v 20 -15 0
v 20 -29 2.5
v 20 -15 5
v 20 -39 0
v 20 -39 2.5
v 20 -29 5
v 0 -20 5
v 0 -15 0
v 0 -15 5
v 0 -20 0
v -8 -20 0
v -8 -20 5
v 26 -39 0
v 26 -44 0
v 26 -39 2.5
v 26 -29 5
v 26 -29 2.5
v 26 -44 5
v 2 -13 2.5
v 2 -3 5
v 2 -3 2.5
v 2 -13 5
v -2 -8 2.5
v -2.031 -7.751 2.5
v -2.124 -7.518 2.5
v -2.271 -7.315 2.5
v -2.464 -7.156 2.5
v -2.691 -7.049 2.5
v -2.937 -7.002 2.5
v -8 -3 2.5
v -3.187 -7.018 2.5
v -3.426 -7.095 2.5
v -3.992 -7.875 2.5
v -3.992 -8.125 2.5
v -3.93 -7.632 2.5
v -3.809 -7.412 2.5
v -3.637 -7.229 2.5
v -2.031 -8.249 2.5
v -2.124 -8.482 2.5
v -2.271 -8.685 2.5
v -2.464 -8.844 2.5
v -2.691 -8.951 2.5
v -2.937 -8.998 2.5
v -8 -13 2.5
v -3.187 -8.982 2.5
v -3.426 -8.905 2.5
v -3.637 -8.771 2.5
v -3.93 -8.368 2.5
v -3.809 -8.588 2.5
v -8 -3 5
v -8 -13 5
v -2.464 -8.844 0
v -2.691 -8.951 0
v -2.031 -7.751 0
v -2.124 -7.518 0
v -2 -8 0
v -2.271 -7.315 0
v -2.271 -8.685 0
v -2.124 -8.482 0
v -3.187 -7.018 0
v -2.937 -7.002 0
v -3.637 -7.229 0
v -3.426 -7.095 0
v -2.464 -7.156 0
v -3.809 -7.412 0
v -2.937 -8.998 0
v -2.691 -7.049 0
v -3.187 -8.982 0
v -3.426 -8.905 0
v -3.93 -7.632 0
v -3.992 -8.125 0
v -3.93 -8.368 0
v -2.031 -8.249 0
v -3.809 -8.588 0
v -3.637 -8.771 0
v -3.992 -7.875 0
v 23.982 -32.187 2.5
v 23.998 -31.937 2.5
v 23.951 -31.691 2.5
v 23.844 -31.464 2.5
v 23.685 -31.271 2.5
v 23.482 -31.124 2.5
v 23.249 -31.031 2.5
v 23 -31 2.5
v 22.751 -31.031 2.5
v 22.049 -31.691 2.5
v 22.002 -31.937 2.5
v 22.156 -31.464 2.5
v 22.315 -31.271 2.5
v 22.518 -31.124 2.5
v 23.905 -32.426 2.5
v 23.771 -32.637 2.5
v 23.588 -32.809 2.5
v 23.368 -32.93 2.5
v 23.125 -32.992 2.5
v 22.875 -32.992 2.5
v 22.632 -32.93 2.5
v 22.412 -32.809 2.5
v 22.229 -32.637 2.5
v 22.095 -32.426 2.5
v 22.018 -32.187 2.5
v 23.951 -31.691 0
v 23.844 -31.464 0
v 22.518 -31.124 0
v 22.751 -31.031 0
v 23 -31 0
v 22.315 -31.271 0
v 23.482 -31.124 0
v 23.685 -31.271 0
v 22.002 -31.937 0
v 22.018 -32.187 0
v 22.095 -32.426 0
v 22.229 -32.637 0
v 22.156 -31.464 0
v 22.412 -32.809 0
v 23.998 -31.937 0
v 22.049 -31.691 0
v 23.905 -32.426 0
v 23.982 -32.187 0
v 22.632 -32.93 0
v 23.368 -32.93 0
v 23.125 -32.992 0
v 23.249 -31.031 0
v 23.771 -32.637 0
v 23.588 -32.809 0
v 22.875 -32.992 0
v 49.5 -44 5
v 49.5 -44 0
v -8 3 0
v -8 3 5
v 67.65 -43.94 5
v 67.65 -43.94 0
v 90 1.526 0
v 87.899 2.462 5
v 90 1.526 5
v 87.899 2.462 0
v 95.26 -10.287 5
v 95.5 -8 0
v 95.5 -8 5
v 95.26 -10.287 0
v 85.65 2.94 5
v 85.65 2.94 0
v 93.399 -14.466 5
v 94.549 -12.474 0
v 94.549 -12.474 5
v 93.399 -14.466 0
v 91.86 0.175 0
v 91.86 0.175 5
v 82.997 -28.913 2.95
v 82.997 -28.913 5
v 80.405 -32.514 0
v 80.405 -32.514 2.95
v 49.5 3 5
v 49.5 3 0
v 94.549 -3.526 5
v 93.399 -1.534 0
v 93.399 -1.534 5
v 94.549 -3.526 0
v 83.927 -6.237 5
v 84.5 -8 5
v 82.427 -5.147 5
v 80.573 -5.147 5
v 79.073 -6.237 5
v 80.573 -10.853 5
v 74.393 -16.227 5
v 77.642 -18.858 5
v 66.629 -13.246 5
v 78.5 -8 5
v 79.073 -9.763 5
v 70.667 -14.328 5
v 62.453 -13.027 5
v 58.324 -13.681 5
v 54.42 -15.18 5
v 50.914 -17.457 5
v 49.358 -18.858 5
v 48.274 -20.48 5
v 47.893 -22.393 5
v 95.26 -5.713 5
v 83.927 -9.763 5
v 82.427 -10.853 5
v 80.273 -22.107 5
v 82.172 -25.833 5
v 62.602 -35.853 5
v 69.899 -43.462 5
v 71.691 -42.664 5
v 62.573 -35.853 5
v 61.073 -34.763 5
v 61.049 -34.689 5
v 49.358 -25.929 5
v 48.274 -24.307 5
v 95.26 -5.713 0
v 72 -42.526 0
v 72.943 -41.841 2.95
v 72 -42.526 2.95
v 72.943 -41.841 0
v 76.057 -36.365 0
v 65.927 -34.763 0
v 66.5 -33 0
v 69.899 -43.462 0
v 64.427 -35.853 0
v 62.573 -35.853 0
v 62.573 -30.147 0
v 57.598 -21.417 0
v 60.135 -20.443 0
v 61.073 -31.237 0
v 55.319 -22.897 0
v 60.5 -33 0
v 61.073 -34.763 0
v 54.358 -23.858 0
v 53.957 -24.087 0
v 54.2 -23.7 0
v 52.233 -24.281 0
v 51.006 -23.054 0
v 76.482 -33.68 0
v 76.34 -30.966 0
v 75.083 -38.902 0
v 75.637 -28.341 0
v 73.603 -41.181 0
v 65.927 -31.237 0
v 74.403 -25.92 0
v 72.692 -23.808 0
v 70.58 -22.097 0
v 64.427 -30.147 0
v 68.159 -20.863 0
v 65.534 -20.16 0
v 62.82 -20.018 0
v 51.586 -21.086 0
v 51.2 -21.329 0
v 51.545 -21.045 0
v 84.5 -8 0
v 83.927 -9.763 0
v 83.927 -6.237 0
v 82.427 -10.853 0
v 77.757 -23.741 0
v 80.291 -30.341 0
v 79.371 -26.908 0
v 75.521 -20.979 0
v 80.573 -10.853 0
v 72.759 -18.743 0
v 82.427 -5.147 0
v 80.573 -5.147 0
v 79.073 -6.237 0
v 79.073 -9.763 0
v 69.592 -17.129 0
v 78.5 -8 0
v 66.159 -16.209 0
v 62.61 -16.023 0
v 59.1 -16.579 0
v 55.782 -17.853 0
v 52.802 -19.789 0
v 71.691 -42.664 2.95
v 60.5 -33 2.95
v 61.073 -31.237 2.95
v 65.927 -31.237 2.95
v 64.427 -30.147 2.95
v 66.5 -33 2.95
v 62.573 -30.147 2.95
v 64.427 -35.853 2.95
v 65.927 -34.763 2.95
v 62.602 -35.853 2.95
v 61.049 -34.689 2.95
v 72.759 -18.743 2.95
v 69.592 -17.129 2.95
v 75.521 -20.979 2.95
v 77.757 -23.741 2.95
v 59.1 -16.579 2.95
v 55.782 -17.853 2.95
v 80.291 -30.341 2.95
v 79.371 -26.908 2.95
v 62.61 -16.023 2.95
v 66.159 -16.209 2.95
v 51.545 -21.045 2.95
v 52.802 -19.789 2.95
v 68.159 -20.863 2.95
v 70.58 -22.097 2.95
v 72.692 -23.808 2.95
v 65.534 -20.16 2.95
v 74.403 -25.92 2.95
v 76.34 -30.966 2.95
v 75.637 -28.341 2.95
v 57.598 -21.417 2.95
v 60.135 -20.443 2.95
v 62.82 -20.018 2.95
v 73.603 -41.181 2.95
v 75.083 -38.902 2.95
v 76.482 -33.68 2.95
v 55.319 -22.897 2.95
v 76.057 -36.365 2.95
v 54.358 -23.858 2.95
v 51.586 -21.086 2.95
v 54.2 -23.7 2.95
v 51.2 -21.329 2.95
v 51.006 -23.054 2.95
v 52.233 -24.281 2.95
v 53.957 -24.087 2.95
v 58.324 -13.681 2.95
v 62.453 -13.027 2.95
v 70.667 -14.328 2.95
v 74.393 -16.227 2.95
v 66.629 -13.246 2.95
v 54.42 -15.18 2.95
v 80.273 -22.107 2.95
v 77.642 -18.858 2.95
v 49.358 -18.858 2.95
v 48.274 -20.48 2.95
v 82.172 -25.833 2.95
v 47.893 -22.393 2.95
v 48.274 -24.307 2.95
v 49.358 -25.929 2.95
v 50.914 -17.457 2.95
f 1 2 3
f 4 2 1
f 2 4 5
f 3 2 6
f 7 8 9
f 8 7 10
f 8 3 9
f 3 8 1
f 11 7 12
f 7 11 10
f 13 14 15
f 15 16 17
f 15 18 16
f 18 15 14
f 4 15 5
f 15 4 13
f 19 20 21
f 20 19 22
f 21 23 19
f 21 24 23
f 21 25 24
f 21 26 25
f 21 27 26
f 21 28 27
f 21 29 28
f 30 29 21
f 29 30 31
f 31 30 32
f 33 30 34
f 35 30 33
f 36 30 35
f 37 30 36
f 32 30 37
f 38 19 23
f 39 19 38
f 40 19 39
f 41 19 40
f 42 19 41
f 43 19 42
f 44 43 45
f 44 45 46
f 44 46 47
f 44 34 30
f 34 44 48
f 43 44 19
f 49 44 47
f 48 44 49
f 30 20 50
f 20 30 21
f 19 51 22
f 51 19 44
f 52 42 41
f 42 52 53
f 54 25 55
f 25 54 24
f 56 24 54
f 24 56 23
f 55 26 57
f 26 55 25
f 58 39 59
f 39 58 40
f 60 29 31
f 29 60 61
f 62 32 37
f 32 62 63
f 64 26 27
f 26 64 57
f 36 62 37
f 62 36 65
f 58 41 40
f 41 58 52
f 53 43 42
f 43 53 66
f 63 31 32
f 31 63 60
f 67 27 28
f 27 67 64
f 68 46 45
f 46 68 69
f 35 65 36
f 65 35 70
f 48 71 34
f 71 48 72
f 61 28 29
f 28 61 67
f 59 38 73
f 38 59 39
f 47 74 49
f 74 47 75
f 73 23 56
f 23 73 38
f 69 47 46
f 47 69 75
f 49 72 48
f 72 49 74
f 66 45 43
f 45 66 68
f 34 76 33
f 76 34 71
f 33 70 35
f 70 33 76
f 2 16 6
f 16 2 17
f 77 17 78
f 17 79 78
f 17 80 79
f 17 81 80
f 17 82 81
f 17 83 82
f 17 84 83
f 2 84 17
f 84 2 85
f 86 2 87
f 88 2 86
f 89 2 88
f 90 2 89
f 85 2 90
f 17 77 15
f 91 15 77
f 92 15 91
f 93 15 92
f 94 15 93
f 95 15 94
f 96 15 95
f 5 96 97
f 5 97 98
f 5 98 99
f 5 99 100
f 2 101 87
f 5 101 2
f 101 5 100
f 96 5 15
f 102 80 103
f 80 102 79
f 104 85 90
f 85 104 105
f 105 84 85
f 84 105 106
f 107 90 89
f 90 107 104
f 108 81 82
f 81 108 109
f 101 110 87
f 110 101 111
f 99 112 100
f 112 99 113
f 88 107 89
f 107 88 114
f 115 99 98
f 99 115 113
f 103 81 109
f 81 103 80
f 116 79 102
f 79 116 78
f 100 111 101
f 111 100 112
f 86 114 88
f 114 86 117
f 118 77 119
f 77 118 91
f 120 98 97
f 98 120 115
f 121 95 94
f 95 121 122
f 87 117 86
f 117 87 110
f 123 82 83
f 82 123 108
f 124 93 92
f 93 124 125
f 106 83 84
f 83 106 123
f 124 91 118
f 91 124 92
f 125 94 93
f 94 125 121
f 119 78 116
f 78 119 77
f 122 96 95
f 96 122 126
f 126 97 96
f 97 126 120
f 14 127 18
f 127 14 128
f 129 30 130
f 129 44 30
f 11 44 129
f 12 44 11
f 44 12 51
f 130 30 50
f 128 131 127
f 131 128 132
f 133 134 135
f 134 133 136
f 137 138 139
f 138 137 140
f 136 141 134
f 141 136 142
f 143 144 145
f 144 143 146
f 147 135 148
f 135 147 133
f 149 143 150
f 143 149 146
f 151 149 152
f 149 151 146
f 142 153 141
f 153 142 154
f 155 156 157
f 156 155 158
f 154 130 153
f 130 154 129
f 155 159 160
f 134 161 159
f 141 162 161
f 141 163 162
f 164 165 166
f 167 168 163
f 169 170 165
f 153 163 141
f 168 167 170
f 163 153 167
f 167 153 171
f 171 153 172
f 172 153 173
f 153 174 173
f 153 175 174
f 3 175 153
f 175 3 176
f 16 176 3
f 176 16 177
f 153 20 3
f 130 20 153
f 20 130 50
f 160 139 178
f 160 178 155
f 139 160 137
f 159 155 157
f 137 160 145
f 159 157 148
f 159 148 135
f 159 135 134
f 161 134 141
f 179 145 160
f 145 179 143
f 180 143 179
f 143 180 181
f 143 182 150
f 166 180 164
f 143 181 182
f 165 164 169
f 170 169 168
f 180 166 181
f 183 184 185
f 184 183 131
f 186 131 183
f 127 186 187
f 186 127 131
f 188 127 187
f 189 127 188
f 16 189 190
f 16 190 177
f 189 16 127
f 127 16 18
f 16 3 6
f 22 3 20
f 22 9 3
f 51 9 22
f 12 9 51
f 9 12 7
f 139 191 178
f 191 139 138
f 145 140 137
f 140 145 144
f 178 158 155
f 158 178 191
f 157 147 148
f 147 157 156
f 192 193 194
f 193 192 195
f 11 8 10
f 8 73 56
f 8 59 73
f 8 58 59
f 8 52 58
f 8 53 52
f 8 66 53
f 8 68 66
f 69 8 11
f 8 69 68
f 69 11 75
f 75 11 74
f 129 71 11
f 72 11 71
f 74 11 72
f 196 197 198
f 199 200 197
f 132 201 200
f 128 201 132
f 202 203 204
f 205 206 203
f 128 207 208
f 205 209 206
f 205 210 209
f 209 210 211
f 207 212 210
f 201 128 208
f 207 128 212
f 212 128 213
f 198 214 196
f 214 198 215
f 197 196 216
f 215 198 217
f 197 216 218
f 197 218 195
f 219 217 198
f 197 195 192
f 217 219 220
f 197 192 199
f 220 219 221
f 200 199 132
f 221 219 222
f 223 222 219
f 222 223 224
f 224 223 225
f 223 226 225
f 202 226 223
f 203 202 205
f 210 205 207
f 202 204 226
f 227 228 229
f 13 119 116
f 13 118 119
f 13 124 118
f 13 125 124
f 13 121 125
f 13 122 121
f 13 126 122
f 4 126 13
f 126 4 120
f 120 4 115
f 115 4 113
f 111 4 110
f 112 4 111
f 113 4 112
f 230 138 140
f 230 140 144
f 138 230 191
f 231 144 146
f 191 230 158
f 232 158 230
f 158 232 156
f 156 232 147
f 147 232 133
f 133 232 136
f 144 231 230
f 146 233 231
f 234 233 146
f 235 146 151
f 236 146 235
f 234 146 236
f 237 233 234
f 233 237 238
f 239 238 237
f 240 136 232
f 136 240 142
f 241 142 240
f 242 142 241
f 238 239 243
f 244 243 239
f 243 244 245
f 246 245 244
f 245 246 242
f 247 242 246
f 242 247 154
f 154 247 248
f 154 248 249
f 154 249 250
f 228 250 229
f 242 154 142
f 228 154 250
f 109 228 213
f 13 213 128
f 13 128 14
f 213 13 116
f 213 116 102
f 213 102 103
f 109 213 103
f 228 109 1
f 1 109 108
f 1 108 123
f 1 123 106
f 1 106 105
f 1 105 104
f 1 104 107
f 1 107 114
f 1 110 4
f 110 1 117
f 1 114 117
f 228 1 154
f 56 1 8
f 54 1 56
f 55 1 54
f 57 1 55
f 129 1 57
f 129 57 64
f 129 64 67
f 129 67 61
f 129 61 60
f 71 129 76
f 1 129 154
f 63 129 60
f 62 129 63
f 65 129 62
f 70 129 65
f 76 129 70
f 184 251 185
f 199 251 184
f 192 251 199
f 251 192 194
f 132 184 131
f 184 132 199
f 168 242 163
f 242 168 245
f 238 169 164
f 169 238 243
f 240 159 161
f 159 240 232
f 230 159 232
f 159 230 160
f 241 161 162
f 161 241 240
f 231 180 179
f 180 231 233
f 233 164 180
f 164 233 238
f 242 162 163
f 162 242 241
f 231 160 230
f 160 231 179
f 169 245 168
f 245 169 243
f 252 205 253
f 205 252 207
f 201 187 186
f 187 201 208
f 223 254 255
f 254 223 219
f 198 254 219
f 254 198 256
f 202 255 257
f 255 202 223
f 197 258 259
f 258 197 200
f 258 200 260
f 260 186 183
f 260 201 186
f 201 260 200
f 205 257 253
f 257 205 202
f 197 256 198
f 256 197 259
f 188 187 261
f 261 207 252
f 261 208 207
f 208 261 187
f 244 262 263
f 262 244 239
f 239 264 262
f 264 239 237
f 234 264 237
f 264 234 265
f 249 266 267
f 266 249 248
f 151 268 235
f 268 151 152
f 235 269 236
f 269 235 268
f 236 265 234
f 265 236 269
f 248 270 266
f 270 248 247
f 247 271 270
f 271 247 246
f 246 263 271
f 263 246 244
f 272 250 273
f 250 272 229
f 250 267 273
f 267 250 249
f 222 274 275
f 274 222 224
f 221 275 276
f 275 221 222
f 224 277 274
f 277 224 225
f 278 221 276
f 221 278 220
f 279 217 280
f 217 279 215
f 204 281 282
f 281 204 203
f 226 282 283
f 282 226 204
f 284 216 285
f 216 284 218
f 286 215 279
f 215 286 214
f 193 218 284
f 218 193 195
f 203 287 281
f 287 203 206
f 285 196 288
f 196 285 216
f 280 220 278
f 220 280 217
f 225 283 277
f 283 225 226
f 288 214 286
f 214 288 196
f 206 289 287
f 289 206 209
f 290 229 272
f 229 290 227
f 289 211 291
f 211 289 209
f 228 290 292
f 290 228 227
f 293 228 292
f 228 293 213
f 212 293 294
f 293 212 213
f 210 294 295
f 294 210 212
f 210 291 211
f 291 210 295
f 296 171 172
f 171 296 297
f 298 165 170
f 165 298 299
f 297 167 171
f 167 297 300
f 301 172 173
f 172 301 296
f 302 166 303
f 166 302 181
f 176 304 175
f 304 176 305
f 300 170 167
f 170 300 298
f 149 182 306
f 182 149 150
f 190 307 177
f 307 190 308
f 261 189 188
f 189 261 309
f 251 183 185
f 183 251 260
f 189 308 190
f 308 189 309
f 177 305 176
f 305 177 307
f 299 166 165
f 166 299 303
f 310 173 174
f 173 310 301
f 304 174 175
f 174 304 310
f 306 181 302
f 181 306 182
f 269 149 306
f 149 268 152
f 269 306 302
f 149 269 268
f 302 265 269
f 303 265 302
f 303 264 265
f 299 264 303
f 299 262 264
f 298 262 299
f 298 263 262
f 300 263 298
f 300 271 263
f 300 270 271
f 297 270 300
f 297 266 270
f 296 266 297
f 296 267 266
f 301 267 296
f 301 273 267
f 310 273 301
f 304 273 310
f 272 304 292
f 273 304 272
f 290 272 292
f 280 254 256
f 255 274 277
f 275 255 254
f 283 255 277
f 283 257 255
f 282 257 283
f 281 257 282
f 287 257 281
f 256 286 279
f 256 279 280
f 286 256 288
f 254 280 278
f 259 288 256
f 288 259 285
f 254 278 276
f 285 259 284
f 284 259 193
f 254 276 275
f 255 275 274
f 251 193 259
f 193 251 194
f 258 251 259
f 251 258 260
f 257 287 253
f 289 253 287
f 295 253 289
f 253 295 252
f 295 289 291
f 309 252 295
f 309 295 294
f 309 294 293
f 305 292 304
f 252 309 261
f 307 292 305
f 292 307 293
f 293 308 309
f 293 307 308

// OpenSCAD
// file: Connector.scad
include <../Settings.scad>;

ConnectorDefaults_Length = 8;
ConnectorDefaults_Width = 6;
ConnectorDefaults_Thickness = 5;
ConnectorDefaults_HoleRadius = 1;
ConnectorDefaults_SlipRadius = 0.2; // Radius increase in clip to allow thread to slip

ConnectorTest();

module Clip(
Length =ConnectorDefaults_Length,
Width = ConnectorDefaults_Width,
Thickness = ConnectorDefaults_Thickness,
HoleRadius = ConnectorDefaults_HoleRadius,
SlipRadius = ConnectorDefaults_SlipRadius){
	translate(v = [0,-Width/2,Thickness/2])
		difference(){
			translate(v = [-d,0,0]){
				cube(size=[Length+d,Width,Thickness/2]);
			}
			translate(v = [Length-(Width/2),Width/2,-d])
				color("blue")cylinder(h=Thickness+2*d,r= HoleRadius+SlipRadius, $fn =25);
		}
}

module ClipHole(
Length =ConnectorDefaults_Length,
Width = ConnectorDefaults_Width,
Thickness = ConnectorDefaults_Thickness,
HoleRadius = ConnectorDefaults_HoleRadius){
translate(v = [0,-Width/2,Thickness/2])
	union(){
		translate(v = [-d,0,0])
			cube(size=[Length+d,Width,Thickness/2+d]);
		translate(v = [Length-(Width/2),Width/2,(-Thickness/2)-d])
			color("red")cylinder(h=Thickness+2*d,r= HoleRadius, $fn =25);
	}
}





module ConnectorTest(){

	translate(v = [0,20,0])
		ClipHole();

	translate(v = [0,40,0])
		Clip();

	%color("green") difference(){
		union(){
			difference(){
				translate(v = [-5,-10,0])
					cube(size = [30,20,5]);
			
				translate(v = [0,0,0])
					ClipHole();
			}
		}
		translate(v = [-6,-22,-1])
			color("green") cube(size = [32,22,7]);
	}

	difference(){
		translate(v = [0,0,0])
			color("red") Clip();
		translate(v = [-6,-22,-1])
			color("red") cube(size = [32,22,7]);
	}
}
// file: ../Settings.scad
// Mesurements Of Platform Actual & Global Settings
// Mesurements ACTUAL
PlateWidth = 228;
PlateDepth = 145;
PlateHeight = 5;

ArmWidth = 20;
ArmHeight = 24;
ArmForwardProjection = 25;
ArmRearProjection = 50;
ArmVOffset = 15;

BaseWidth = 129;
BaseHeight = 5;
BaseForwardProjection = 10;
BaseRearProjection = 10;
BaseVOffset = 20;

BaseDeflectorLength = 20;
BaseDeflectorAngle = 45;

ScrewsWidthOutset = 35;
ScrewsDepthOutset = 35;
ScrewsHeadRadius = 10;
ScrewsHeadHeight = 2;
ScrewsHeadProtrusion = 5;
ScrewsShaftRadius = 2;
ScrewsHeadCutoutRadius = 2;

RearPlugWidth = 10;
RearPlugHeight = 5;
RearPlugVOffset = 1;

// Options
// ****************************************************************************************************

d = 0.05;   //Delta

ClipSticksize = 8;
PlateThickness = 5;

TensionerBearingRadius = 2;
TensionerOffsetRadius = 15;
TensionerAngle = 45;
TensionerBearingExtention = 3;
TensionerInset = 2;

//lips to keep the belt in
Lip = 3;
//TopLip = 500;
BottomLip = 5;

MidPlateOverlap = 20;
MidPlateOverlapHeight = 10;
MidPlateOverlapOffset = 7;
ClipHoleSize = 5;

LowerPlateCrossover =10;

RollerCore = 2;
RollerClearance = 2;
RollerLength = PlateDepth - 2*RollerClearance;

UpperRollerProjection  = 40;
UpperRollerRadius = 8;

LowerRollerProjection = 20;
LowerRollerRadius = 6;

RollerBearingCutoutRadius = 3;

IbeamProjection = 15;
IbeamPlateThikness = 6;


// Calculated
// ************************************************************************************************************
PlateX = BaseWidth/2;

RollerLength = PlateDepth - 2*RollerClearance;
PlateArmOverhang = PlateWidth/2 - BaseWidth/2  - ArmWidth; 

UpperRollerPlateX = ArmWidth+PlateArmOverhang+UpperRollerProjection-UpperRollerRadius;
UpperRollerPlateY = -UpperRollerRadius; 

LowerRollerPlateX = ArmWidth+PlateArmOverhang+LowerRollerProjection-LowerRollerRadius;
LowerRollerPlateY = -(ArmVOffset+ArmHeight)+LowerRollerRadius;
// main file
// Roller Project Part #1 Front Bracket

include <../Settings.scad>;
use <Connector.scad>;

FrontRightPlate();
//RearRightPlate();
//FrontLeftPlate();
//RearLeftPlate();


module TensionCurve(Radius,Depth){
	union(){
		difference(){
			translate(v=[0,0,]){
				color("red") cylinder(h =Depth ,r =TensionerOffsetRadius+Radius);
			}
			translate(v=[0,0,-d])
				cylinder(h =Depth+2*d ,r =TensionerOffsetRadius-Radius);	
		
			translate( v = [-(TensionerOffsetRadius+Radius),-(TensionerOffsetRadius+Radius),-d])
				cube(size = [TensionerOffsetRadius+Radius,2*(TensionerOffsetRadius+Radius),Depth+2*d]);
		}
		translate(v=[0,TensionerOffsetRadius,0])
			cylinder(h =Depth ,r =Radius);	
	}
}

module FrontRightPlate(){
	RightPlate();
}

module RearRightPlate(){
	mirror([ 0, 1, 0 ]){
		RightPlate();
	}
}

module FrontLeftPlate(){
	LeftPlate();
}

module RearLeftPlate(){
	mirror([ 0, 1, 0 ]){
		LeftPlate();
	}
}

module RightPlate(){
	difference(){
		GenericPlate();
		translate(v=[LowerRollerPlateX,LowerRollerPlateY,-d]){
			rotate(a = TensionerAngle, v=[0,0,1] ){
				TensionCurve(TensionerBearingRadius, PlateThickness +2*d );
				translate(v=[0,0,PlateThickness-TensionerInset])
					hull()
						TensionCurve(TensionerBearingRadius+TensionerBearingExtention , TensionerInset+2*d);
			}
		}
	}
}

module LeftPlate(){
	mirror([ 1, 0, 0 ]){
	GenericPlate();
	}
}

module GenericPlate(){
		union(){
	difference(){
		union(){
			color("DarkSeaGreen") hull(){
				//main block
				translate(v = [-ClipSticksize,-(ArmVOffset+ArmHeight)-BottomLip,0]){
					color("red") cube(size = [ClipSticksize+ArmWidth+PlateArmOverhang,
ArmHeight+ArmVOffset+Lip+BottomLip,
PlateThickness]);
				}
				//magic lower block
				translate(v = [-ClipSticksize,-(ArmVOffset+ArmHeight+Lip+ClipSticksize),0]){
					//color("red") cube(size = [ClipSticksize+ArmWidth+PlateArmOverhang,1,PlateThickness]);
				}
				//top curve
				translate(v = [UpperRollerPlateX+Lip,UpperRollerPlateY,0]){
					cylinder(h= PlateThickness ,r = UpperRollerRadius+Lip); 
				}
				//lower curve
				 translate(v = [LowerRollerPlateX+Lip,LowerRollerPlateY,0]){
					cylinder(h= PlateThickness ,r = LowerRollerRadius+BottomLip); 
				}
			}
		}
		union(){
			// Arm Hole
				translate(v = [0,-(ArmVOffset+ArmHeight)-d,-d])
					cube(size = [ArmWidth,ArmHeight+d,PlateThickness+2*d]);
	
			//base hole
			translate(v = [-ClipSticksize-d,-BaseVOffset-BaseHeight-ArmHeight,-d])
				cube(size = [ClipSticksize+ArmWidth+d,BaseHeight+ArmHeight,PlateThickness+2*d]);
			
			translate(v= [ArmWidth-d,-(ArmVOffset+ArmHeight+BottomLip+d),-d])
				cube(size = [6+d,BottomLip+d,PlateThickness+2*d]);
		}

		//upper bearing hole
		translate(v = [UpperRollerPlateX,UpperRollerPlateY,-d]){
			cylinder(h= PlateThickness+2*d ,r = RollerBearingCutoutRadius);
		}
		//lower bearing hole
		translate(v = [LowerRollerPlateX,LowerRollerPlateY,-d]){
			cylinder(h= PlateThickness+2*d ,r = RollerBearingCutoutRadius);
		}

		//top clip
		translate(v = [-ClipSticksize, -ArmVOffset+MidPlateOverlapOffset,0])
			ClipHole(Thickness= PlateThickness,Width = 10,Length = 10);

		//bottom clip TODO MATH IS BAD HERE
		translate(v = [ArmWidth+3,-(ArmVOffset+ArmHeight),0])
			rotate(v=[0,0,1], a = 90)
		 		ClipHole(Thickness= PlateThickness,Length = 10);


}
	}
}//end module
